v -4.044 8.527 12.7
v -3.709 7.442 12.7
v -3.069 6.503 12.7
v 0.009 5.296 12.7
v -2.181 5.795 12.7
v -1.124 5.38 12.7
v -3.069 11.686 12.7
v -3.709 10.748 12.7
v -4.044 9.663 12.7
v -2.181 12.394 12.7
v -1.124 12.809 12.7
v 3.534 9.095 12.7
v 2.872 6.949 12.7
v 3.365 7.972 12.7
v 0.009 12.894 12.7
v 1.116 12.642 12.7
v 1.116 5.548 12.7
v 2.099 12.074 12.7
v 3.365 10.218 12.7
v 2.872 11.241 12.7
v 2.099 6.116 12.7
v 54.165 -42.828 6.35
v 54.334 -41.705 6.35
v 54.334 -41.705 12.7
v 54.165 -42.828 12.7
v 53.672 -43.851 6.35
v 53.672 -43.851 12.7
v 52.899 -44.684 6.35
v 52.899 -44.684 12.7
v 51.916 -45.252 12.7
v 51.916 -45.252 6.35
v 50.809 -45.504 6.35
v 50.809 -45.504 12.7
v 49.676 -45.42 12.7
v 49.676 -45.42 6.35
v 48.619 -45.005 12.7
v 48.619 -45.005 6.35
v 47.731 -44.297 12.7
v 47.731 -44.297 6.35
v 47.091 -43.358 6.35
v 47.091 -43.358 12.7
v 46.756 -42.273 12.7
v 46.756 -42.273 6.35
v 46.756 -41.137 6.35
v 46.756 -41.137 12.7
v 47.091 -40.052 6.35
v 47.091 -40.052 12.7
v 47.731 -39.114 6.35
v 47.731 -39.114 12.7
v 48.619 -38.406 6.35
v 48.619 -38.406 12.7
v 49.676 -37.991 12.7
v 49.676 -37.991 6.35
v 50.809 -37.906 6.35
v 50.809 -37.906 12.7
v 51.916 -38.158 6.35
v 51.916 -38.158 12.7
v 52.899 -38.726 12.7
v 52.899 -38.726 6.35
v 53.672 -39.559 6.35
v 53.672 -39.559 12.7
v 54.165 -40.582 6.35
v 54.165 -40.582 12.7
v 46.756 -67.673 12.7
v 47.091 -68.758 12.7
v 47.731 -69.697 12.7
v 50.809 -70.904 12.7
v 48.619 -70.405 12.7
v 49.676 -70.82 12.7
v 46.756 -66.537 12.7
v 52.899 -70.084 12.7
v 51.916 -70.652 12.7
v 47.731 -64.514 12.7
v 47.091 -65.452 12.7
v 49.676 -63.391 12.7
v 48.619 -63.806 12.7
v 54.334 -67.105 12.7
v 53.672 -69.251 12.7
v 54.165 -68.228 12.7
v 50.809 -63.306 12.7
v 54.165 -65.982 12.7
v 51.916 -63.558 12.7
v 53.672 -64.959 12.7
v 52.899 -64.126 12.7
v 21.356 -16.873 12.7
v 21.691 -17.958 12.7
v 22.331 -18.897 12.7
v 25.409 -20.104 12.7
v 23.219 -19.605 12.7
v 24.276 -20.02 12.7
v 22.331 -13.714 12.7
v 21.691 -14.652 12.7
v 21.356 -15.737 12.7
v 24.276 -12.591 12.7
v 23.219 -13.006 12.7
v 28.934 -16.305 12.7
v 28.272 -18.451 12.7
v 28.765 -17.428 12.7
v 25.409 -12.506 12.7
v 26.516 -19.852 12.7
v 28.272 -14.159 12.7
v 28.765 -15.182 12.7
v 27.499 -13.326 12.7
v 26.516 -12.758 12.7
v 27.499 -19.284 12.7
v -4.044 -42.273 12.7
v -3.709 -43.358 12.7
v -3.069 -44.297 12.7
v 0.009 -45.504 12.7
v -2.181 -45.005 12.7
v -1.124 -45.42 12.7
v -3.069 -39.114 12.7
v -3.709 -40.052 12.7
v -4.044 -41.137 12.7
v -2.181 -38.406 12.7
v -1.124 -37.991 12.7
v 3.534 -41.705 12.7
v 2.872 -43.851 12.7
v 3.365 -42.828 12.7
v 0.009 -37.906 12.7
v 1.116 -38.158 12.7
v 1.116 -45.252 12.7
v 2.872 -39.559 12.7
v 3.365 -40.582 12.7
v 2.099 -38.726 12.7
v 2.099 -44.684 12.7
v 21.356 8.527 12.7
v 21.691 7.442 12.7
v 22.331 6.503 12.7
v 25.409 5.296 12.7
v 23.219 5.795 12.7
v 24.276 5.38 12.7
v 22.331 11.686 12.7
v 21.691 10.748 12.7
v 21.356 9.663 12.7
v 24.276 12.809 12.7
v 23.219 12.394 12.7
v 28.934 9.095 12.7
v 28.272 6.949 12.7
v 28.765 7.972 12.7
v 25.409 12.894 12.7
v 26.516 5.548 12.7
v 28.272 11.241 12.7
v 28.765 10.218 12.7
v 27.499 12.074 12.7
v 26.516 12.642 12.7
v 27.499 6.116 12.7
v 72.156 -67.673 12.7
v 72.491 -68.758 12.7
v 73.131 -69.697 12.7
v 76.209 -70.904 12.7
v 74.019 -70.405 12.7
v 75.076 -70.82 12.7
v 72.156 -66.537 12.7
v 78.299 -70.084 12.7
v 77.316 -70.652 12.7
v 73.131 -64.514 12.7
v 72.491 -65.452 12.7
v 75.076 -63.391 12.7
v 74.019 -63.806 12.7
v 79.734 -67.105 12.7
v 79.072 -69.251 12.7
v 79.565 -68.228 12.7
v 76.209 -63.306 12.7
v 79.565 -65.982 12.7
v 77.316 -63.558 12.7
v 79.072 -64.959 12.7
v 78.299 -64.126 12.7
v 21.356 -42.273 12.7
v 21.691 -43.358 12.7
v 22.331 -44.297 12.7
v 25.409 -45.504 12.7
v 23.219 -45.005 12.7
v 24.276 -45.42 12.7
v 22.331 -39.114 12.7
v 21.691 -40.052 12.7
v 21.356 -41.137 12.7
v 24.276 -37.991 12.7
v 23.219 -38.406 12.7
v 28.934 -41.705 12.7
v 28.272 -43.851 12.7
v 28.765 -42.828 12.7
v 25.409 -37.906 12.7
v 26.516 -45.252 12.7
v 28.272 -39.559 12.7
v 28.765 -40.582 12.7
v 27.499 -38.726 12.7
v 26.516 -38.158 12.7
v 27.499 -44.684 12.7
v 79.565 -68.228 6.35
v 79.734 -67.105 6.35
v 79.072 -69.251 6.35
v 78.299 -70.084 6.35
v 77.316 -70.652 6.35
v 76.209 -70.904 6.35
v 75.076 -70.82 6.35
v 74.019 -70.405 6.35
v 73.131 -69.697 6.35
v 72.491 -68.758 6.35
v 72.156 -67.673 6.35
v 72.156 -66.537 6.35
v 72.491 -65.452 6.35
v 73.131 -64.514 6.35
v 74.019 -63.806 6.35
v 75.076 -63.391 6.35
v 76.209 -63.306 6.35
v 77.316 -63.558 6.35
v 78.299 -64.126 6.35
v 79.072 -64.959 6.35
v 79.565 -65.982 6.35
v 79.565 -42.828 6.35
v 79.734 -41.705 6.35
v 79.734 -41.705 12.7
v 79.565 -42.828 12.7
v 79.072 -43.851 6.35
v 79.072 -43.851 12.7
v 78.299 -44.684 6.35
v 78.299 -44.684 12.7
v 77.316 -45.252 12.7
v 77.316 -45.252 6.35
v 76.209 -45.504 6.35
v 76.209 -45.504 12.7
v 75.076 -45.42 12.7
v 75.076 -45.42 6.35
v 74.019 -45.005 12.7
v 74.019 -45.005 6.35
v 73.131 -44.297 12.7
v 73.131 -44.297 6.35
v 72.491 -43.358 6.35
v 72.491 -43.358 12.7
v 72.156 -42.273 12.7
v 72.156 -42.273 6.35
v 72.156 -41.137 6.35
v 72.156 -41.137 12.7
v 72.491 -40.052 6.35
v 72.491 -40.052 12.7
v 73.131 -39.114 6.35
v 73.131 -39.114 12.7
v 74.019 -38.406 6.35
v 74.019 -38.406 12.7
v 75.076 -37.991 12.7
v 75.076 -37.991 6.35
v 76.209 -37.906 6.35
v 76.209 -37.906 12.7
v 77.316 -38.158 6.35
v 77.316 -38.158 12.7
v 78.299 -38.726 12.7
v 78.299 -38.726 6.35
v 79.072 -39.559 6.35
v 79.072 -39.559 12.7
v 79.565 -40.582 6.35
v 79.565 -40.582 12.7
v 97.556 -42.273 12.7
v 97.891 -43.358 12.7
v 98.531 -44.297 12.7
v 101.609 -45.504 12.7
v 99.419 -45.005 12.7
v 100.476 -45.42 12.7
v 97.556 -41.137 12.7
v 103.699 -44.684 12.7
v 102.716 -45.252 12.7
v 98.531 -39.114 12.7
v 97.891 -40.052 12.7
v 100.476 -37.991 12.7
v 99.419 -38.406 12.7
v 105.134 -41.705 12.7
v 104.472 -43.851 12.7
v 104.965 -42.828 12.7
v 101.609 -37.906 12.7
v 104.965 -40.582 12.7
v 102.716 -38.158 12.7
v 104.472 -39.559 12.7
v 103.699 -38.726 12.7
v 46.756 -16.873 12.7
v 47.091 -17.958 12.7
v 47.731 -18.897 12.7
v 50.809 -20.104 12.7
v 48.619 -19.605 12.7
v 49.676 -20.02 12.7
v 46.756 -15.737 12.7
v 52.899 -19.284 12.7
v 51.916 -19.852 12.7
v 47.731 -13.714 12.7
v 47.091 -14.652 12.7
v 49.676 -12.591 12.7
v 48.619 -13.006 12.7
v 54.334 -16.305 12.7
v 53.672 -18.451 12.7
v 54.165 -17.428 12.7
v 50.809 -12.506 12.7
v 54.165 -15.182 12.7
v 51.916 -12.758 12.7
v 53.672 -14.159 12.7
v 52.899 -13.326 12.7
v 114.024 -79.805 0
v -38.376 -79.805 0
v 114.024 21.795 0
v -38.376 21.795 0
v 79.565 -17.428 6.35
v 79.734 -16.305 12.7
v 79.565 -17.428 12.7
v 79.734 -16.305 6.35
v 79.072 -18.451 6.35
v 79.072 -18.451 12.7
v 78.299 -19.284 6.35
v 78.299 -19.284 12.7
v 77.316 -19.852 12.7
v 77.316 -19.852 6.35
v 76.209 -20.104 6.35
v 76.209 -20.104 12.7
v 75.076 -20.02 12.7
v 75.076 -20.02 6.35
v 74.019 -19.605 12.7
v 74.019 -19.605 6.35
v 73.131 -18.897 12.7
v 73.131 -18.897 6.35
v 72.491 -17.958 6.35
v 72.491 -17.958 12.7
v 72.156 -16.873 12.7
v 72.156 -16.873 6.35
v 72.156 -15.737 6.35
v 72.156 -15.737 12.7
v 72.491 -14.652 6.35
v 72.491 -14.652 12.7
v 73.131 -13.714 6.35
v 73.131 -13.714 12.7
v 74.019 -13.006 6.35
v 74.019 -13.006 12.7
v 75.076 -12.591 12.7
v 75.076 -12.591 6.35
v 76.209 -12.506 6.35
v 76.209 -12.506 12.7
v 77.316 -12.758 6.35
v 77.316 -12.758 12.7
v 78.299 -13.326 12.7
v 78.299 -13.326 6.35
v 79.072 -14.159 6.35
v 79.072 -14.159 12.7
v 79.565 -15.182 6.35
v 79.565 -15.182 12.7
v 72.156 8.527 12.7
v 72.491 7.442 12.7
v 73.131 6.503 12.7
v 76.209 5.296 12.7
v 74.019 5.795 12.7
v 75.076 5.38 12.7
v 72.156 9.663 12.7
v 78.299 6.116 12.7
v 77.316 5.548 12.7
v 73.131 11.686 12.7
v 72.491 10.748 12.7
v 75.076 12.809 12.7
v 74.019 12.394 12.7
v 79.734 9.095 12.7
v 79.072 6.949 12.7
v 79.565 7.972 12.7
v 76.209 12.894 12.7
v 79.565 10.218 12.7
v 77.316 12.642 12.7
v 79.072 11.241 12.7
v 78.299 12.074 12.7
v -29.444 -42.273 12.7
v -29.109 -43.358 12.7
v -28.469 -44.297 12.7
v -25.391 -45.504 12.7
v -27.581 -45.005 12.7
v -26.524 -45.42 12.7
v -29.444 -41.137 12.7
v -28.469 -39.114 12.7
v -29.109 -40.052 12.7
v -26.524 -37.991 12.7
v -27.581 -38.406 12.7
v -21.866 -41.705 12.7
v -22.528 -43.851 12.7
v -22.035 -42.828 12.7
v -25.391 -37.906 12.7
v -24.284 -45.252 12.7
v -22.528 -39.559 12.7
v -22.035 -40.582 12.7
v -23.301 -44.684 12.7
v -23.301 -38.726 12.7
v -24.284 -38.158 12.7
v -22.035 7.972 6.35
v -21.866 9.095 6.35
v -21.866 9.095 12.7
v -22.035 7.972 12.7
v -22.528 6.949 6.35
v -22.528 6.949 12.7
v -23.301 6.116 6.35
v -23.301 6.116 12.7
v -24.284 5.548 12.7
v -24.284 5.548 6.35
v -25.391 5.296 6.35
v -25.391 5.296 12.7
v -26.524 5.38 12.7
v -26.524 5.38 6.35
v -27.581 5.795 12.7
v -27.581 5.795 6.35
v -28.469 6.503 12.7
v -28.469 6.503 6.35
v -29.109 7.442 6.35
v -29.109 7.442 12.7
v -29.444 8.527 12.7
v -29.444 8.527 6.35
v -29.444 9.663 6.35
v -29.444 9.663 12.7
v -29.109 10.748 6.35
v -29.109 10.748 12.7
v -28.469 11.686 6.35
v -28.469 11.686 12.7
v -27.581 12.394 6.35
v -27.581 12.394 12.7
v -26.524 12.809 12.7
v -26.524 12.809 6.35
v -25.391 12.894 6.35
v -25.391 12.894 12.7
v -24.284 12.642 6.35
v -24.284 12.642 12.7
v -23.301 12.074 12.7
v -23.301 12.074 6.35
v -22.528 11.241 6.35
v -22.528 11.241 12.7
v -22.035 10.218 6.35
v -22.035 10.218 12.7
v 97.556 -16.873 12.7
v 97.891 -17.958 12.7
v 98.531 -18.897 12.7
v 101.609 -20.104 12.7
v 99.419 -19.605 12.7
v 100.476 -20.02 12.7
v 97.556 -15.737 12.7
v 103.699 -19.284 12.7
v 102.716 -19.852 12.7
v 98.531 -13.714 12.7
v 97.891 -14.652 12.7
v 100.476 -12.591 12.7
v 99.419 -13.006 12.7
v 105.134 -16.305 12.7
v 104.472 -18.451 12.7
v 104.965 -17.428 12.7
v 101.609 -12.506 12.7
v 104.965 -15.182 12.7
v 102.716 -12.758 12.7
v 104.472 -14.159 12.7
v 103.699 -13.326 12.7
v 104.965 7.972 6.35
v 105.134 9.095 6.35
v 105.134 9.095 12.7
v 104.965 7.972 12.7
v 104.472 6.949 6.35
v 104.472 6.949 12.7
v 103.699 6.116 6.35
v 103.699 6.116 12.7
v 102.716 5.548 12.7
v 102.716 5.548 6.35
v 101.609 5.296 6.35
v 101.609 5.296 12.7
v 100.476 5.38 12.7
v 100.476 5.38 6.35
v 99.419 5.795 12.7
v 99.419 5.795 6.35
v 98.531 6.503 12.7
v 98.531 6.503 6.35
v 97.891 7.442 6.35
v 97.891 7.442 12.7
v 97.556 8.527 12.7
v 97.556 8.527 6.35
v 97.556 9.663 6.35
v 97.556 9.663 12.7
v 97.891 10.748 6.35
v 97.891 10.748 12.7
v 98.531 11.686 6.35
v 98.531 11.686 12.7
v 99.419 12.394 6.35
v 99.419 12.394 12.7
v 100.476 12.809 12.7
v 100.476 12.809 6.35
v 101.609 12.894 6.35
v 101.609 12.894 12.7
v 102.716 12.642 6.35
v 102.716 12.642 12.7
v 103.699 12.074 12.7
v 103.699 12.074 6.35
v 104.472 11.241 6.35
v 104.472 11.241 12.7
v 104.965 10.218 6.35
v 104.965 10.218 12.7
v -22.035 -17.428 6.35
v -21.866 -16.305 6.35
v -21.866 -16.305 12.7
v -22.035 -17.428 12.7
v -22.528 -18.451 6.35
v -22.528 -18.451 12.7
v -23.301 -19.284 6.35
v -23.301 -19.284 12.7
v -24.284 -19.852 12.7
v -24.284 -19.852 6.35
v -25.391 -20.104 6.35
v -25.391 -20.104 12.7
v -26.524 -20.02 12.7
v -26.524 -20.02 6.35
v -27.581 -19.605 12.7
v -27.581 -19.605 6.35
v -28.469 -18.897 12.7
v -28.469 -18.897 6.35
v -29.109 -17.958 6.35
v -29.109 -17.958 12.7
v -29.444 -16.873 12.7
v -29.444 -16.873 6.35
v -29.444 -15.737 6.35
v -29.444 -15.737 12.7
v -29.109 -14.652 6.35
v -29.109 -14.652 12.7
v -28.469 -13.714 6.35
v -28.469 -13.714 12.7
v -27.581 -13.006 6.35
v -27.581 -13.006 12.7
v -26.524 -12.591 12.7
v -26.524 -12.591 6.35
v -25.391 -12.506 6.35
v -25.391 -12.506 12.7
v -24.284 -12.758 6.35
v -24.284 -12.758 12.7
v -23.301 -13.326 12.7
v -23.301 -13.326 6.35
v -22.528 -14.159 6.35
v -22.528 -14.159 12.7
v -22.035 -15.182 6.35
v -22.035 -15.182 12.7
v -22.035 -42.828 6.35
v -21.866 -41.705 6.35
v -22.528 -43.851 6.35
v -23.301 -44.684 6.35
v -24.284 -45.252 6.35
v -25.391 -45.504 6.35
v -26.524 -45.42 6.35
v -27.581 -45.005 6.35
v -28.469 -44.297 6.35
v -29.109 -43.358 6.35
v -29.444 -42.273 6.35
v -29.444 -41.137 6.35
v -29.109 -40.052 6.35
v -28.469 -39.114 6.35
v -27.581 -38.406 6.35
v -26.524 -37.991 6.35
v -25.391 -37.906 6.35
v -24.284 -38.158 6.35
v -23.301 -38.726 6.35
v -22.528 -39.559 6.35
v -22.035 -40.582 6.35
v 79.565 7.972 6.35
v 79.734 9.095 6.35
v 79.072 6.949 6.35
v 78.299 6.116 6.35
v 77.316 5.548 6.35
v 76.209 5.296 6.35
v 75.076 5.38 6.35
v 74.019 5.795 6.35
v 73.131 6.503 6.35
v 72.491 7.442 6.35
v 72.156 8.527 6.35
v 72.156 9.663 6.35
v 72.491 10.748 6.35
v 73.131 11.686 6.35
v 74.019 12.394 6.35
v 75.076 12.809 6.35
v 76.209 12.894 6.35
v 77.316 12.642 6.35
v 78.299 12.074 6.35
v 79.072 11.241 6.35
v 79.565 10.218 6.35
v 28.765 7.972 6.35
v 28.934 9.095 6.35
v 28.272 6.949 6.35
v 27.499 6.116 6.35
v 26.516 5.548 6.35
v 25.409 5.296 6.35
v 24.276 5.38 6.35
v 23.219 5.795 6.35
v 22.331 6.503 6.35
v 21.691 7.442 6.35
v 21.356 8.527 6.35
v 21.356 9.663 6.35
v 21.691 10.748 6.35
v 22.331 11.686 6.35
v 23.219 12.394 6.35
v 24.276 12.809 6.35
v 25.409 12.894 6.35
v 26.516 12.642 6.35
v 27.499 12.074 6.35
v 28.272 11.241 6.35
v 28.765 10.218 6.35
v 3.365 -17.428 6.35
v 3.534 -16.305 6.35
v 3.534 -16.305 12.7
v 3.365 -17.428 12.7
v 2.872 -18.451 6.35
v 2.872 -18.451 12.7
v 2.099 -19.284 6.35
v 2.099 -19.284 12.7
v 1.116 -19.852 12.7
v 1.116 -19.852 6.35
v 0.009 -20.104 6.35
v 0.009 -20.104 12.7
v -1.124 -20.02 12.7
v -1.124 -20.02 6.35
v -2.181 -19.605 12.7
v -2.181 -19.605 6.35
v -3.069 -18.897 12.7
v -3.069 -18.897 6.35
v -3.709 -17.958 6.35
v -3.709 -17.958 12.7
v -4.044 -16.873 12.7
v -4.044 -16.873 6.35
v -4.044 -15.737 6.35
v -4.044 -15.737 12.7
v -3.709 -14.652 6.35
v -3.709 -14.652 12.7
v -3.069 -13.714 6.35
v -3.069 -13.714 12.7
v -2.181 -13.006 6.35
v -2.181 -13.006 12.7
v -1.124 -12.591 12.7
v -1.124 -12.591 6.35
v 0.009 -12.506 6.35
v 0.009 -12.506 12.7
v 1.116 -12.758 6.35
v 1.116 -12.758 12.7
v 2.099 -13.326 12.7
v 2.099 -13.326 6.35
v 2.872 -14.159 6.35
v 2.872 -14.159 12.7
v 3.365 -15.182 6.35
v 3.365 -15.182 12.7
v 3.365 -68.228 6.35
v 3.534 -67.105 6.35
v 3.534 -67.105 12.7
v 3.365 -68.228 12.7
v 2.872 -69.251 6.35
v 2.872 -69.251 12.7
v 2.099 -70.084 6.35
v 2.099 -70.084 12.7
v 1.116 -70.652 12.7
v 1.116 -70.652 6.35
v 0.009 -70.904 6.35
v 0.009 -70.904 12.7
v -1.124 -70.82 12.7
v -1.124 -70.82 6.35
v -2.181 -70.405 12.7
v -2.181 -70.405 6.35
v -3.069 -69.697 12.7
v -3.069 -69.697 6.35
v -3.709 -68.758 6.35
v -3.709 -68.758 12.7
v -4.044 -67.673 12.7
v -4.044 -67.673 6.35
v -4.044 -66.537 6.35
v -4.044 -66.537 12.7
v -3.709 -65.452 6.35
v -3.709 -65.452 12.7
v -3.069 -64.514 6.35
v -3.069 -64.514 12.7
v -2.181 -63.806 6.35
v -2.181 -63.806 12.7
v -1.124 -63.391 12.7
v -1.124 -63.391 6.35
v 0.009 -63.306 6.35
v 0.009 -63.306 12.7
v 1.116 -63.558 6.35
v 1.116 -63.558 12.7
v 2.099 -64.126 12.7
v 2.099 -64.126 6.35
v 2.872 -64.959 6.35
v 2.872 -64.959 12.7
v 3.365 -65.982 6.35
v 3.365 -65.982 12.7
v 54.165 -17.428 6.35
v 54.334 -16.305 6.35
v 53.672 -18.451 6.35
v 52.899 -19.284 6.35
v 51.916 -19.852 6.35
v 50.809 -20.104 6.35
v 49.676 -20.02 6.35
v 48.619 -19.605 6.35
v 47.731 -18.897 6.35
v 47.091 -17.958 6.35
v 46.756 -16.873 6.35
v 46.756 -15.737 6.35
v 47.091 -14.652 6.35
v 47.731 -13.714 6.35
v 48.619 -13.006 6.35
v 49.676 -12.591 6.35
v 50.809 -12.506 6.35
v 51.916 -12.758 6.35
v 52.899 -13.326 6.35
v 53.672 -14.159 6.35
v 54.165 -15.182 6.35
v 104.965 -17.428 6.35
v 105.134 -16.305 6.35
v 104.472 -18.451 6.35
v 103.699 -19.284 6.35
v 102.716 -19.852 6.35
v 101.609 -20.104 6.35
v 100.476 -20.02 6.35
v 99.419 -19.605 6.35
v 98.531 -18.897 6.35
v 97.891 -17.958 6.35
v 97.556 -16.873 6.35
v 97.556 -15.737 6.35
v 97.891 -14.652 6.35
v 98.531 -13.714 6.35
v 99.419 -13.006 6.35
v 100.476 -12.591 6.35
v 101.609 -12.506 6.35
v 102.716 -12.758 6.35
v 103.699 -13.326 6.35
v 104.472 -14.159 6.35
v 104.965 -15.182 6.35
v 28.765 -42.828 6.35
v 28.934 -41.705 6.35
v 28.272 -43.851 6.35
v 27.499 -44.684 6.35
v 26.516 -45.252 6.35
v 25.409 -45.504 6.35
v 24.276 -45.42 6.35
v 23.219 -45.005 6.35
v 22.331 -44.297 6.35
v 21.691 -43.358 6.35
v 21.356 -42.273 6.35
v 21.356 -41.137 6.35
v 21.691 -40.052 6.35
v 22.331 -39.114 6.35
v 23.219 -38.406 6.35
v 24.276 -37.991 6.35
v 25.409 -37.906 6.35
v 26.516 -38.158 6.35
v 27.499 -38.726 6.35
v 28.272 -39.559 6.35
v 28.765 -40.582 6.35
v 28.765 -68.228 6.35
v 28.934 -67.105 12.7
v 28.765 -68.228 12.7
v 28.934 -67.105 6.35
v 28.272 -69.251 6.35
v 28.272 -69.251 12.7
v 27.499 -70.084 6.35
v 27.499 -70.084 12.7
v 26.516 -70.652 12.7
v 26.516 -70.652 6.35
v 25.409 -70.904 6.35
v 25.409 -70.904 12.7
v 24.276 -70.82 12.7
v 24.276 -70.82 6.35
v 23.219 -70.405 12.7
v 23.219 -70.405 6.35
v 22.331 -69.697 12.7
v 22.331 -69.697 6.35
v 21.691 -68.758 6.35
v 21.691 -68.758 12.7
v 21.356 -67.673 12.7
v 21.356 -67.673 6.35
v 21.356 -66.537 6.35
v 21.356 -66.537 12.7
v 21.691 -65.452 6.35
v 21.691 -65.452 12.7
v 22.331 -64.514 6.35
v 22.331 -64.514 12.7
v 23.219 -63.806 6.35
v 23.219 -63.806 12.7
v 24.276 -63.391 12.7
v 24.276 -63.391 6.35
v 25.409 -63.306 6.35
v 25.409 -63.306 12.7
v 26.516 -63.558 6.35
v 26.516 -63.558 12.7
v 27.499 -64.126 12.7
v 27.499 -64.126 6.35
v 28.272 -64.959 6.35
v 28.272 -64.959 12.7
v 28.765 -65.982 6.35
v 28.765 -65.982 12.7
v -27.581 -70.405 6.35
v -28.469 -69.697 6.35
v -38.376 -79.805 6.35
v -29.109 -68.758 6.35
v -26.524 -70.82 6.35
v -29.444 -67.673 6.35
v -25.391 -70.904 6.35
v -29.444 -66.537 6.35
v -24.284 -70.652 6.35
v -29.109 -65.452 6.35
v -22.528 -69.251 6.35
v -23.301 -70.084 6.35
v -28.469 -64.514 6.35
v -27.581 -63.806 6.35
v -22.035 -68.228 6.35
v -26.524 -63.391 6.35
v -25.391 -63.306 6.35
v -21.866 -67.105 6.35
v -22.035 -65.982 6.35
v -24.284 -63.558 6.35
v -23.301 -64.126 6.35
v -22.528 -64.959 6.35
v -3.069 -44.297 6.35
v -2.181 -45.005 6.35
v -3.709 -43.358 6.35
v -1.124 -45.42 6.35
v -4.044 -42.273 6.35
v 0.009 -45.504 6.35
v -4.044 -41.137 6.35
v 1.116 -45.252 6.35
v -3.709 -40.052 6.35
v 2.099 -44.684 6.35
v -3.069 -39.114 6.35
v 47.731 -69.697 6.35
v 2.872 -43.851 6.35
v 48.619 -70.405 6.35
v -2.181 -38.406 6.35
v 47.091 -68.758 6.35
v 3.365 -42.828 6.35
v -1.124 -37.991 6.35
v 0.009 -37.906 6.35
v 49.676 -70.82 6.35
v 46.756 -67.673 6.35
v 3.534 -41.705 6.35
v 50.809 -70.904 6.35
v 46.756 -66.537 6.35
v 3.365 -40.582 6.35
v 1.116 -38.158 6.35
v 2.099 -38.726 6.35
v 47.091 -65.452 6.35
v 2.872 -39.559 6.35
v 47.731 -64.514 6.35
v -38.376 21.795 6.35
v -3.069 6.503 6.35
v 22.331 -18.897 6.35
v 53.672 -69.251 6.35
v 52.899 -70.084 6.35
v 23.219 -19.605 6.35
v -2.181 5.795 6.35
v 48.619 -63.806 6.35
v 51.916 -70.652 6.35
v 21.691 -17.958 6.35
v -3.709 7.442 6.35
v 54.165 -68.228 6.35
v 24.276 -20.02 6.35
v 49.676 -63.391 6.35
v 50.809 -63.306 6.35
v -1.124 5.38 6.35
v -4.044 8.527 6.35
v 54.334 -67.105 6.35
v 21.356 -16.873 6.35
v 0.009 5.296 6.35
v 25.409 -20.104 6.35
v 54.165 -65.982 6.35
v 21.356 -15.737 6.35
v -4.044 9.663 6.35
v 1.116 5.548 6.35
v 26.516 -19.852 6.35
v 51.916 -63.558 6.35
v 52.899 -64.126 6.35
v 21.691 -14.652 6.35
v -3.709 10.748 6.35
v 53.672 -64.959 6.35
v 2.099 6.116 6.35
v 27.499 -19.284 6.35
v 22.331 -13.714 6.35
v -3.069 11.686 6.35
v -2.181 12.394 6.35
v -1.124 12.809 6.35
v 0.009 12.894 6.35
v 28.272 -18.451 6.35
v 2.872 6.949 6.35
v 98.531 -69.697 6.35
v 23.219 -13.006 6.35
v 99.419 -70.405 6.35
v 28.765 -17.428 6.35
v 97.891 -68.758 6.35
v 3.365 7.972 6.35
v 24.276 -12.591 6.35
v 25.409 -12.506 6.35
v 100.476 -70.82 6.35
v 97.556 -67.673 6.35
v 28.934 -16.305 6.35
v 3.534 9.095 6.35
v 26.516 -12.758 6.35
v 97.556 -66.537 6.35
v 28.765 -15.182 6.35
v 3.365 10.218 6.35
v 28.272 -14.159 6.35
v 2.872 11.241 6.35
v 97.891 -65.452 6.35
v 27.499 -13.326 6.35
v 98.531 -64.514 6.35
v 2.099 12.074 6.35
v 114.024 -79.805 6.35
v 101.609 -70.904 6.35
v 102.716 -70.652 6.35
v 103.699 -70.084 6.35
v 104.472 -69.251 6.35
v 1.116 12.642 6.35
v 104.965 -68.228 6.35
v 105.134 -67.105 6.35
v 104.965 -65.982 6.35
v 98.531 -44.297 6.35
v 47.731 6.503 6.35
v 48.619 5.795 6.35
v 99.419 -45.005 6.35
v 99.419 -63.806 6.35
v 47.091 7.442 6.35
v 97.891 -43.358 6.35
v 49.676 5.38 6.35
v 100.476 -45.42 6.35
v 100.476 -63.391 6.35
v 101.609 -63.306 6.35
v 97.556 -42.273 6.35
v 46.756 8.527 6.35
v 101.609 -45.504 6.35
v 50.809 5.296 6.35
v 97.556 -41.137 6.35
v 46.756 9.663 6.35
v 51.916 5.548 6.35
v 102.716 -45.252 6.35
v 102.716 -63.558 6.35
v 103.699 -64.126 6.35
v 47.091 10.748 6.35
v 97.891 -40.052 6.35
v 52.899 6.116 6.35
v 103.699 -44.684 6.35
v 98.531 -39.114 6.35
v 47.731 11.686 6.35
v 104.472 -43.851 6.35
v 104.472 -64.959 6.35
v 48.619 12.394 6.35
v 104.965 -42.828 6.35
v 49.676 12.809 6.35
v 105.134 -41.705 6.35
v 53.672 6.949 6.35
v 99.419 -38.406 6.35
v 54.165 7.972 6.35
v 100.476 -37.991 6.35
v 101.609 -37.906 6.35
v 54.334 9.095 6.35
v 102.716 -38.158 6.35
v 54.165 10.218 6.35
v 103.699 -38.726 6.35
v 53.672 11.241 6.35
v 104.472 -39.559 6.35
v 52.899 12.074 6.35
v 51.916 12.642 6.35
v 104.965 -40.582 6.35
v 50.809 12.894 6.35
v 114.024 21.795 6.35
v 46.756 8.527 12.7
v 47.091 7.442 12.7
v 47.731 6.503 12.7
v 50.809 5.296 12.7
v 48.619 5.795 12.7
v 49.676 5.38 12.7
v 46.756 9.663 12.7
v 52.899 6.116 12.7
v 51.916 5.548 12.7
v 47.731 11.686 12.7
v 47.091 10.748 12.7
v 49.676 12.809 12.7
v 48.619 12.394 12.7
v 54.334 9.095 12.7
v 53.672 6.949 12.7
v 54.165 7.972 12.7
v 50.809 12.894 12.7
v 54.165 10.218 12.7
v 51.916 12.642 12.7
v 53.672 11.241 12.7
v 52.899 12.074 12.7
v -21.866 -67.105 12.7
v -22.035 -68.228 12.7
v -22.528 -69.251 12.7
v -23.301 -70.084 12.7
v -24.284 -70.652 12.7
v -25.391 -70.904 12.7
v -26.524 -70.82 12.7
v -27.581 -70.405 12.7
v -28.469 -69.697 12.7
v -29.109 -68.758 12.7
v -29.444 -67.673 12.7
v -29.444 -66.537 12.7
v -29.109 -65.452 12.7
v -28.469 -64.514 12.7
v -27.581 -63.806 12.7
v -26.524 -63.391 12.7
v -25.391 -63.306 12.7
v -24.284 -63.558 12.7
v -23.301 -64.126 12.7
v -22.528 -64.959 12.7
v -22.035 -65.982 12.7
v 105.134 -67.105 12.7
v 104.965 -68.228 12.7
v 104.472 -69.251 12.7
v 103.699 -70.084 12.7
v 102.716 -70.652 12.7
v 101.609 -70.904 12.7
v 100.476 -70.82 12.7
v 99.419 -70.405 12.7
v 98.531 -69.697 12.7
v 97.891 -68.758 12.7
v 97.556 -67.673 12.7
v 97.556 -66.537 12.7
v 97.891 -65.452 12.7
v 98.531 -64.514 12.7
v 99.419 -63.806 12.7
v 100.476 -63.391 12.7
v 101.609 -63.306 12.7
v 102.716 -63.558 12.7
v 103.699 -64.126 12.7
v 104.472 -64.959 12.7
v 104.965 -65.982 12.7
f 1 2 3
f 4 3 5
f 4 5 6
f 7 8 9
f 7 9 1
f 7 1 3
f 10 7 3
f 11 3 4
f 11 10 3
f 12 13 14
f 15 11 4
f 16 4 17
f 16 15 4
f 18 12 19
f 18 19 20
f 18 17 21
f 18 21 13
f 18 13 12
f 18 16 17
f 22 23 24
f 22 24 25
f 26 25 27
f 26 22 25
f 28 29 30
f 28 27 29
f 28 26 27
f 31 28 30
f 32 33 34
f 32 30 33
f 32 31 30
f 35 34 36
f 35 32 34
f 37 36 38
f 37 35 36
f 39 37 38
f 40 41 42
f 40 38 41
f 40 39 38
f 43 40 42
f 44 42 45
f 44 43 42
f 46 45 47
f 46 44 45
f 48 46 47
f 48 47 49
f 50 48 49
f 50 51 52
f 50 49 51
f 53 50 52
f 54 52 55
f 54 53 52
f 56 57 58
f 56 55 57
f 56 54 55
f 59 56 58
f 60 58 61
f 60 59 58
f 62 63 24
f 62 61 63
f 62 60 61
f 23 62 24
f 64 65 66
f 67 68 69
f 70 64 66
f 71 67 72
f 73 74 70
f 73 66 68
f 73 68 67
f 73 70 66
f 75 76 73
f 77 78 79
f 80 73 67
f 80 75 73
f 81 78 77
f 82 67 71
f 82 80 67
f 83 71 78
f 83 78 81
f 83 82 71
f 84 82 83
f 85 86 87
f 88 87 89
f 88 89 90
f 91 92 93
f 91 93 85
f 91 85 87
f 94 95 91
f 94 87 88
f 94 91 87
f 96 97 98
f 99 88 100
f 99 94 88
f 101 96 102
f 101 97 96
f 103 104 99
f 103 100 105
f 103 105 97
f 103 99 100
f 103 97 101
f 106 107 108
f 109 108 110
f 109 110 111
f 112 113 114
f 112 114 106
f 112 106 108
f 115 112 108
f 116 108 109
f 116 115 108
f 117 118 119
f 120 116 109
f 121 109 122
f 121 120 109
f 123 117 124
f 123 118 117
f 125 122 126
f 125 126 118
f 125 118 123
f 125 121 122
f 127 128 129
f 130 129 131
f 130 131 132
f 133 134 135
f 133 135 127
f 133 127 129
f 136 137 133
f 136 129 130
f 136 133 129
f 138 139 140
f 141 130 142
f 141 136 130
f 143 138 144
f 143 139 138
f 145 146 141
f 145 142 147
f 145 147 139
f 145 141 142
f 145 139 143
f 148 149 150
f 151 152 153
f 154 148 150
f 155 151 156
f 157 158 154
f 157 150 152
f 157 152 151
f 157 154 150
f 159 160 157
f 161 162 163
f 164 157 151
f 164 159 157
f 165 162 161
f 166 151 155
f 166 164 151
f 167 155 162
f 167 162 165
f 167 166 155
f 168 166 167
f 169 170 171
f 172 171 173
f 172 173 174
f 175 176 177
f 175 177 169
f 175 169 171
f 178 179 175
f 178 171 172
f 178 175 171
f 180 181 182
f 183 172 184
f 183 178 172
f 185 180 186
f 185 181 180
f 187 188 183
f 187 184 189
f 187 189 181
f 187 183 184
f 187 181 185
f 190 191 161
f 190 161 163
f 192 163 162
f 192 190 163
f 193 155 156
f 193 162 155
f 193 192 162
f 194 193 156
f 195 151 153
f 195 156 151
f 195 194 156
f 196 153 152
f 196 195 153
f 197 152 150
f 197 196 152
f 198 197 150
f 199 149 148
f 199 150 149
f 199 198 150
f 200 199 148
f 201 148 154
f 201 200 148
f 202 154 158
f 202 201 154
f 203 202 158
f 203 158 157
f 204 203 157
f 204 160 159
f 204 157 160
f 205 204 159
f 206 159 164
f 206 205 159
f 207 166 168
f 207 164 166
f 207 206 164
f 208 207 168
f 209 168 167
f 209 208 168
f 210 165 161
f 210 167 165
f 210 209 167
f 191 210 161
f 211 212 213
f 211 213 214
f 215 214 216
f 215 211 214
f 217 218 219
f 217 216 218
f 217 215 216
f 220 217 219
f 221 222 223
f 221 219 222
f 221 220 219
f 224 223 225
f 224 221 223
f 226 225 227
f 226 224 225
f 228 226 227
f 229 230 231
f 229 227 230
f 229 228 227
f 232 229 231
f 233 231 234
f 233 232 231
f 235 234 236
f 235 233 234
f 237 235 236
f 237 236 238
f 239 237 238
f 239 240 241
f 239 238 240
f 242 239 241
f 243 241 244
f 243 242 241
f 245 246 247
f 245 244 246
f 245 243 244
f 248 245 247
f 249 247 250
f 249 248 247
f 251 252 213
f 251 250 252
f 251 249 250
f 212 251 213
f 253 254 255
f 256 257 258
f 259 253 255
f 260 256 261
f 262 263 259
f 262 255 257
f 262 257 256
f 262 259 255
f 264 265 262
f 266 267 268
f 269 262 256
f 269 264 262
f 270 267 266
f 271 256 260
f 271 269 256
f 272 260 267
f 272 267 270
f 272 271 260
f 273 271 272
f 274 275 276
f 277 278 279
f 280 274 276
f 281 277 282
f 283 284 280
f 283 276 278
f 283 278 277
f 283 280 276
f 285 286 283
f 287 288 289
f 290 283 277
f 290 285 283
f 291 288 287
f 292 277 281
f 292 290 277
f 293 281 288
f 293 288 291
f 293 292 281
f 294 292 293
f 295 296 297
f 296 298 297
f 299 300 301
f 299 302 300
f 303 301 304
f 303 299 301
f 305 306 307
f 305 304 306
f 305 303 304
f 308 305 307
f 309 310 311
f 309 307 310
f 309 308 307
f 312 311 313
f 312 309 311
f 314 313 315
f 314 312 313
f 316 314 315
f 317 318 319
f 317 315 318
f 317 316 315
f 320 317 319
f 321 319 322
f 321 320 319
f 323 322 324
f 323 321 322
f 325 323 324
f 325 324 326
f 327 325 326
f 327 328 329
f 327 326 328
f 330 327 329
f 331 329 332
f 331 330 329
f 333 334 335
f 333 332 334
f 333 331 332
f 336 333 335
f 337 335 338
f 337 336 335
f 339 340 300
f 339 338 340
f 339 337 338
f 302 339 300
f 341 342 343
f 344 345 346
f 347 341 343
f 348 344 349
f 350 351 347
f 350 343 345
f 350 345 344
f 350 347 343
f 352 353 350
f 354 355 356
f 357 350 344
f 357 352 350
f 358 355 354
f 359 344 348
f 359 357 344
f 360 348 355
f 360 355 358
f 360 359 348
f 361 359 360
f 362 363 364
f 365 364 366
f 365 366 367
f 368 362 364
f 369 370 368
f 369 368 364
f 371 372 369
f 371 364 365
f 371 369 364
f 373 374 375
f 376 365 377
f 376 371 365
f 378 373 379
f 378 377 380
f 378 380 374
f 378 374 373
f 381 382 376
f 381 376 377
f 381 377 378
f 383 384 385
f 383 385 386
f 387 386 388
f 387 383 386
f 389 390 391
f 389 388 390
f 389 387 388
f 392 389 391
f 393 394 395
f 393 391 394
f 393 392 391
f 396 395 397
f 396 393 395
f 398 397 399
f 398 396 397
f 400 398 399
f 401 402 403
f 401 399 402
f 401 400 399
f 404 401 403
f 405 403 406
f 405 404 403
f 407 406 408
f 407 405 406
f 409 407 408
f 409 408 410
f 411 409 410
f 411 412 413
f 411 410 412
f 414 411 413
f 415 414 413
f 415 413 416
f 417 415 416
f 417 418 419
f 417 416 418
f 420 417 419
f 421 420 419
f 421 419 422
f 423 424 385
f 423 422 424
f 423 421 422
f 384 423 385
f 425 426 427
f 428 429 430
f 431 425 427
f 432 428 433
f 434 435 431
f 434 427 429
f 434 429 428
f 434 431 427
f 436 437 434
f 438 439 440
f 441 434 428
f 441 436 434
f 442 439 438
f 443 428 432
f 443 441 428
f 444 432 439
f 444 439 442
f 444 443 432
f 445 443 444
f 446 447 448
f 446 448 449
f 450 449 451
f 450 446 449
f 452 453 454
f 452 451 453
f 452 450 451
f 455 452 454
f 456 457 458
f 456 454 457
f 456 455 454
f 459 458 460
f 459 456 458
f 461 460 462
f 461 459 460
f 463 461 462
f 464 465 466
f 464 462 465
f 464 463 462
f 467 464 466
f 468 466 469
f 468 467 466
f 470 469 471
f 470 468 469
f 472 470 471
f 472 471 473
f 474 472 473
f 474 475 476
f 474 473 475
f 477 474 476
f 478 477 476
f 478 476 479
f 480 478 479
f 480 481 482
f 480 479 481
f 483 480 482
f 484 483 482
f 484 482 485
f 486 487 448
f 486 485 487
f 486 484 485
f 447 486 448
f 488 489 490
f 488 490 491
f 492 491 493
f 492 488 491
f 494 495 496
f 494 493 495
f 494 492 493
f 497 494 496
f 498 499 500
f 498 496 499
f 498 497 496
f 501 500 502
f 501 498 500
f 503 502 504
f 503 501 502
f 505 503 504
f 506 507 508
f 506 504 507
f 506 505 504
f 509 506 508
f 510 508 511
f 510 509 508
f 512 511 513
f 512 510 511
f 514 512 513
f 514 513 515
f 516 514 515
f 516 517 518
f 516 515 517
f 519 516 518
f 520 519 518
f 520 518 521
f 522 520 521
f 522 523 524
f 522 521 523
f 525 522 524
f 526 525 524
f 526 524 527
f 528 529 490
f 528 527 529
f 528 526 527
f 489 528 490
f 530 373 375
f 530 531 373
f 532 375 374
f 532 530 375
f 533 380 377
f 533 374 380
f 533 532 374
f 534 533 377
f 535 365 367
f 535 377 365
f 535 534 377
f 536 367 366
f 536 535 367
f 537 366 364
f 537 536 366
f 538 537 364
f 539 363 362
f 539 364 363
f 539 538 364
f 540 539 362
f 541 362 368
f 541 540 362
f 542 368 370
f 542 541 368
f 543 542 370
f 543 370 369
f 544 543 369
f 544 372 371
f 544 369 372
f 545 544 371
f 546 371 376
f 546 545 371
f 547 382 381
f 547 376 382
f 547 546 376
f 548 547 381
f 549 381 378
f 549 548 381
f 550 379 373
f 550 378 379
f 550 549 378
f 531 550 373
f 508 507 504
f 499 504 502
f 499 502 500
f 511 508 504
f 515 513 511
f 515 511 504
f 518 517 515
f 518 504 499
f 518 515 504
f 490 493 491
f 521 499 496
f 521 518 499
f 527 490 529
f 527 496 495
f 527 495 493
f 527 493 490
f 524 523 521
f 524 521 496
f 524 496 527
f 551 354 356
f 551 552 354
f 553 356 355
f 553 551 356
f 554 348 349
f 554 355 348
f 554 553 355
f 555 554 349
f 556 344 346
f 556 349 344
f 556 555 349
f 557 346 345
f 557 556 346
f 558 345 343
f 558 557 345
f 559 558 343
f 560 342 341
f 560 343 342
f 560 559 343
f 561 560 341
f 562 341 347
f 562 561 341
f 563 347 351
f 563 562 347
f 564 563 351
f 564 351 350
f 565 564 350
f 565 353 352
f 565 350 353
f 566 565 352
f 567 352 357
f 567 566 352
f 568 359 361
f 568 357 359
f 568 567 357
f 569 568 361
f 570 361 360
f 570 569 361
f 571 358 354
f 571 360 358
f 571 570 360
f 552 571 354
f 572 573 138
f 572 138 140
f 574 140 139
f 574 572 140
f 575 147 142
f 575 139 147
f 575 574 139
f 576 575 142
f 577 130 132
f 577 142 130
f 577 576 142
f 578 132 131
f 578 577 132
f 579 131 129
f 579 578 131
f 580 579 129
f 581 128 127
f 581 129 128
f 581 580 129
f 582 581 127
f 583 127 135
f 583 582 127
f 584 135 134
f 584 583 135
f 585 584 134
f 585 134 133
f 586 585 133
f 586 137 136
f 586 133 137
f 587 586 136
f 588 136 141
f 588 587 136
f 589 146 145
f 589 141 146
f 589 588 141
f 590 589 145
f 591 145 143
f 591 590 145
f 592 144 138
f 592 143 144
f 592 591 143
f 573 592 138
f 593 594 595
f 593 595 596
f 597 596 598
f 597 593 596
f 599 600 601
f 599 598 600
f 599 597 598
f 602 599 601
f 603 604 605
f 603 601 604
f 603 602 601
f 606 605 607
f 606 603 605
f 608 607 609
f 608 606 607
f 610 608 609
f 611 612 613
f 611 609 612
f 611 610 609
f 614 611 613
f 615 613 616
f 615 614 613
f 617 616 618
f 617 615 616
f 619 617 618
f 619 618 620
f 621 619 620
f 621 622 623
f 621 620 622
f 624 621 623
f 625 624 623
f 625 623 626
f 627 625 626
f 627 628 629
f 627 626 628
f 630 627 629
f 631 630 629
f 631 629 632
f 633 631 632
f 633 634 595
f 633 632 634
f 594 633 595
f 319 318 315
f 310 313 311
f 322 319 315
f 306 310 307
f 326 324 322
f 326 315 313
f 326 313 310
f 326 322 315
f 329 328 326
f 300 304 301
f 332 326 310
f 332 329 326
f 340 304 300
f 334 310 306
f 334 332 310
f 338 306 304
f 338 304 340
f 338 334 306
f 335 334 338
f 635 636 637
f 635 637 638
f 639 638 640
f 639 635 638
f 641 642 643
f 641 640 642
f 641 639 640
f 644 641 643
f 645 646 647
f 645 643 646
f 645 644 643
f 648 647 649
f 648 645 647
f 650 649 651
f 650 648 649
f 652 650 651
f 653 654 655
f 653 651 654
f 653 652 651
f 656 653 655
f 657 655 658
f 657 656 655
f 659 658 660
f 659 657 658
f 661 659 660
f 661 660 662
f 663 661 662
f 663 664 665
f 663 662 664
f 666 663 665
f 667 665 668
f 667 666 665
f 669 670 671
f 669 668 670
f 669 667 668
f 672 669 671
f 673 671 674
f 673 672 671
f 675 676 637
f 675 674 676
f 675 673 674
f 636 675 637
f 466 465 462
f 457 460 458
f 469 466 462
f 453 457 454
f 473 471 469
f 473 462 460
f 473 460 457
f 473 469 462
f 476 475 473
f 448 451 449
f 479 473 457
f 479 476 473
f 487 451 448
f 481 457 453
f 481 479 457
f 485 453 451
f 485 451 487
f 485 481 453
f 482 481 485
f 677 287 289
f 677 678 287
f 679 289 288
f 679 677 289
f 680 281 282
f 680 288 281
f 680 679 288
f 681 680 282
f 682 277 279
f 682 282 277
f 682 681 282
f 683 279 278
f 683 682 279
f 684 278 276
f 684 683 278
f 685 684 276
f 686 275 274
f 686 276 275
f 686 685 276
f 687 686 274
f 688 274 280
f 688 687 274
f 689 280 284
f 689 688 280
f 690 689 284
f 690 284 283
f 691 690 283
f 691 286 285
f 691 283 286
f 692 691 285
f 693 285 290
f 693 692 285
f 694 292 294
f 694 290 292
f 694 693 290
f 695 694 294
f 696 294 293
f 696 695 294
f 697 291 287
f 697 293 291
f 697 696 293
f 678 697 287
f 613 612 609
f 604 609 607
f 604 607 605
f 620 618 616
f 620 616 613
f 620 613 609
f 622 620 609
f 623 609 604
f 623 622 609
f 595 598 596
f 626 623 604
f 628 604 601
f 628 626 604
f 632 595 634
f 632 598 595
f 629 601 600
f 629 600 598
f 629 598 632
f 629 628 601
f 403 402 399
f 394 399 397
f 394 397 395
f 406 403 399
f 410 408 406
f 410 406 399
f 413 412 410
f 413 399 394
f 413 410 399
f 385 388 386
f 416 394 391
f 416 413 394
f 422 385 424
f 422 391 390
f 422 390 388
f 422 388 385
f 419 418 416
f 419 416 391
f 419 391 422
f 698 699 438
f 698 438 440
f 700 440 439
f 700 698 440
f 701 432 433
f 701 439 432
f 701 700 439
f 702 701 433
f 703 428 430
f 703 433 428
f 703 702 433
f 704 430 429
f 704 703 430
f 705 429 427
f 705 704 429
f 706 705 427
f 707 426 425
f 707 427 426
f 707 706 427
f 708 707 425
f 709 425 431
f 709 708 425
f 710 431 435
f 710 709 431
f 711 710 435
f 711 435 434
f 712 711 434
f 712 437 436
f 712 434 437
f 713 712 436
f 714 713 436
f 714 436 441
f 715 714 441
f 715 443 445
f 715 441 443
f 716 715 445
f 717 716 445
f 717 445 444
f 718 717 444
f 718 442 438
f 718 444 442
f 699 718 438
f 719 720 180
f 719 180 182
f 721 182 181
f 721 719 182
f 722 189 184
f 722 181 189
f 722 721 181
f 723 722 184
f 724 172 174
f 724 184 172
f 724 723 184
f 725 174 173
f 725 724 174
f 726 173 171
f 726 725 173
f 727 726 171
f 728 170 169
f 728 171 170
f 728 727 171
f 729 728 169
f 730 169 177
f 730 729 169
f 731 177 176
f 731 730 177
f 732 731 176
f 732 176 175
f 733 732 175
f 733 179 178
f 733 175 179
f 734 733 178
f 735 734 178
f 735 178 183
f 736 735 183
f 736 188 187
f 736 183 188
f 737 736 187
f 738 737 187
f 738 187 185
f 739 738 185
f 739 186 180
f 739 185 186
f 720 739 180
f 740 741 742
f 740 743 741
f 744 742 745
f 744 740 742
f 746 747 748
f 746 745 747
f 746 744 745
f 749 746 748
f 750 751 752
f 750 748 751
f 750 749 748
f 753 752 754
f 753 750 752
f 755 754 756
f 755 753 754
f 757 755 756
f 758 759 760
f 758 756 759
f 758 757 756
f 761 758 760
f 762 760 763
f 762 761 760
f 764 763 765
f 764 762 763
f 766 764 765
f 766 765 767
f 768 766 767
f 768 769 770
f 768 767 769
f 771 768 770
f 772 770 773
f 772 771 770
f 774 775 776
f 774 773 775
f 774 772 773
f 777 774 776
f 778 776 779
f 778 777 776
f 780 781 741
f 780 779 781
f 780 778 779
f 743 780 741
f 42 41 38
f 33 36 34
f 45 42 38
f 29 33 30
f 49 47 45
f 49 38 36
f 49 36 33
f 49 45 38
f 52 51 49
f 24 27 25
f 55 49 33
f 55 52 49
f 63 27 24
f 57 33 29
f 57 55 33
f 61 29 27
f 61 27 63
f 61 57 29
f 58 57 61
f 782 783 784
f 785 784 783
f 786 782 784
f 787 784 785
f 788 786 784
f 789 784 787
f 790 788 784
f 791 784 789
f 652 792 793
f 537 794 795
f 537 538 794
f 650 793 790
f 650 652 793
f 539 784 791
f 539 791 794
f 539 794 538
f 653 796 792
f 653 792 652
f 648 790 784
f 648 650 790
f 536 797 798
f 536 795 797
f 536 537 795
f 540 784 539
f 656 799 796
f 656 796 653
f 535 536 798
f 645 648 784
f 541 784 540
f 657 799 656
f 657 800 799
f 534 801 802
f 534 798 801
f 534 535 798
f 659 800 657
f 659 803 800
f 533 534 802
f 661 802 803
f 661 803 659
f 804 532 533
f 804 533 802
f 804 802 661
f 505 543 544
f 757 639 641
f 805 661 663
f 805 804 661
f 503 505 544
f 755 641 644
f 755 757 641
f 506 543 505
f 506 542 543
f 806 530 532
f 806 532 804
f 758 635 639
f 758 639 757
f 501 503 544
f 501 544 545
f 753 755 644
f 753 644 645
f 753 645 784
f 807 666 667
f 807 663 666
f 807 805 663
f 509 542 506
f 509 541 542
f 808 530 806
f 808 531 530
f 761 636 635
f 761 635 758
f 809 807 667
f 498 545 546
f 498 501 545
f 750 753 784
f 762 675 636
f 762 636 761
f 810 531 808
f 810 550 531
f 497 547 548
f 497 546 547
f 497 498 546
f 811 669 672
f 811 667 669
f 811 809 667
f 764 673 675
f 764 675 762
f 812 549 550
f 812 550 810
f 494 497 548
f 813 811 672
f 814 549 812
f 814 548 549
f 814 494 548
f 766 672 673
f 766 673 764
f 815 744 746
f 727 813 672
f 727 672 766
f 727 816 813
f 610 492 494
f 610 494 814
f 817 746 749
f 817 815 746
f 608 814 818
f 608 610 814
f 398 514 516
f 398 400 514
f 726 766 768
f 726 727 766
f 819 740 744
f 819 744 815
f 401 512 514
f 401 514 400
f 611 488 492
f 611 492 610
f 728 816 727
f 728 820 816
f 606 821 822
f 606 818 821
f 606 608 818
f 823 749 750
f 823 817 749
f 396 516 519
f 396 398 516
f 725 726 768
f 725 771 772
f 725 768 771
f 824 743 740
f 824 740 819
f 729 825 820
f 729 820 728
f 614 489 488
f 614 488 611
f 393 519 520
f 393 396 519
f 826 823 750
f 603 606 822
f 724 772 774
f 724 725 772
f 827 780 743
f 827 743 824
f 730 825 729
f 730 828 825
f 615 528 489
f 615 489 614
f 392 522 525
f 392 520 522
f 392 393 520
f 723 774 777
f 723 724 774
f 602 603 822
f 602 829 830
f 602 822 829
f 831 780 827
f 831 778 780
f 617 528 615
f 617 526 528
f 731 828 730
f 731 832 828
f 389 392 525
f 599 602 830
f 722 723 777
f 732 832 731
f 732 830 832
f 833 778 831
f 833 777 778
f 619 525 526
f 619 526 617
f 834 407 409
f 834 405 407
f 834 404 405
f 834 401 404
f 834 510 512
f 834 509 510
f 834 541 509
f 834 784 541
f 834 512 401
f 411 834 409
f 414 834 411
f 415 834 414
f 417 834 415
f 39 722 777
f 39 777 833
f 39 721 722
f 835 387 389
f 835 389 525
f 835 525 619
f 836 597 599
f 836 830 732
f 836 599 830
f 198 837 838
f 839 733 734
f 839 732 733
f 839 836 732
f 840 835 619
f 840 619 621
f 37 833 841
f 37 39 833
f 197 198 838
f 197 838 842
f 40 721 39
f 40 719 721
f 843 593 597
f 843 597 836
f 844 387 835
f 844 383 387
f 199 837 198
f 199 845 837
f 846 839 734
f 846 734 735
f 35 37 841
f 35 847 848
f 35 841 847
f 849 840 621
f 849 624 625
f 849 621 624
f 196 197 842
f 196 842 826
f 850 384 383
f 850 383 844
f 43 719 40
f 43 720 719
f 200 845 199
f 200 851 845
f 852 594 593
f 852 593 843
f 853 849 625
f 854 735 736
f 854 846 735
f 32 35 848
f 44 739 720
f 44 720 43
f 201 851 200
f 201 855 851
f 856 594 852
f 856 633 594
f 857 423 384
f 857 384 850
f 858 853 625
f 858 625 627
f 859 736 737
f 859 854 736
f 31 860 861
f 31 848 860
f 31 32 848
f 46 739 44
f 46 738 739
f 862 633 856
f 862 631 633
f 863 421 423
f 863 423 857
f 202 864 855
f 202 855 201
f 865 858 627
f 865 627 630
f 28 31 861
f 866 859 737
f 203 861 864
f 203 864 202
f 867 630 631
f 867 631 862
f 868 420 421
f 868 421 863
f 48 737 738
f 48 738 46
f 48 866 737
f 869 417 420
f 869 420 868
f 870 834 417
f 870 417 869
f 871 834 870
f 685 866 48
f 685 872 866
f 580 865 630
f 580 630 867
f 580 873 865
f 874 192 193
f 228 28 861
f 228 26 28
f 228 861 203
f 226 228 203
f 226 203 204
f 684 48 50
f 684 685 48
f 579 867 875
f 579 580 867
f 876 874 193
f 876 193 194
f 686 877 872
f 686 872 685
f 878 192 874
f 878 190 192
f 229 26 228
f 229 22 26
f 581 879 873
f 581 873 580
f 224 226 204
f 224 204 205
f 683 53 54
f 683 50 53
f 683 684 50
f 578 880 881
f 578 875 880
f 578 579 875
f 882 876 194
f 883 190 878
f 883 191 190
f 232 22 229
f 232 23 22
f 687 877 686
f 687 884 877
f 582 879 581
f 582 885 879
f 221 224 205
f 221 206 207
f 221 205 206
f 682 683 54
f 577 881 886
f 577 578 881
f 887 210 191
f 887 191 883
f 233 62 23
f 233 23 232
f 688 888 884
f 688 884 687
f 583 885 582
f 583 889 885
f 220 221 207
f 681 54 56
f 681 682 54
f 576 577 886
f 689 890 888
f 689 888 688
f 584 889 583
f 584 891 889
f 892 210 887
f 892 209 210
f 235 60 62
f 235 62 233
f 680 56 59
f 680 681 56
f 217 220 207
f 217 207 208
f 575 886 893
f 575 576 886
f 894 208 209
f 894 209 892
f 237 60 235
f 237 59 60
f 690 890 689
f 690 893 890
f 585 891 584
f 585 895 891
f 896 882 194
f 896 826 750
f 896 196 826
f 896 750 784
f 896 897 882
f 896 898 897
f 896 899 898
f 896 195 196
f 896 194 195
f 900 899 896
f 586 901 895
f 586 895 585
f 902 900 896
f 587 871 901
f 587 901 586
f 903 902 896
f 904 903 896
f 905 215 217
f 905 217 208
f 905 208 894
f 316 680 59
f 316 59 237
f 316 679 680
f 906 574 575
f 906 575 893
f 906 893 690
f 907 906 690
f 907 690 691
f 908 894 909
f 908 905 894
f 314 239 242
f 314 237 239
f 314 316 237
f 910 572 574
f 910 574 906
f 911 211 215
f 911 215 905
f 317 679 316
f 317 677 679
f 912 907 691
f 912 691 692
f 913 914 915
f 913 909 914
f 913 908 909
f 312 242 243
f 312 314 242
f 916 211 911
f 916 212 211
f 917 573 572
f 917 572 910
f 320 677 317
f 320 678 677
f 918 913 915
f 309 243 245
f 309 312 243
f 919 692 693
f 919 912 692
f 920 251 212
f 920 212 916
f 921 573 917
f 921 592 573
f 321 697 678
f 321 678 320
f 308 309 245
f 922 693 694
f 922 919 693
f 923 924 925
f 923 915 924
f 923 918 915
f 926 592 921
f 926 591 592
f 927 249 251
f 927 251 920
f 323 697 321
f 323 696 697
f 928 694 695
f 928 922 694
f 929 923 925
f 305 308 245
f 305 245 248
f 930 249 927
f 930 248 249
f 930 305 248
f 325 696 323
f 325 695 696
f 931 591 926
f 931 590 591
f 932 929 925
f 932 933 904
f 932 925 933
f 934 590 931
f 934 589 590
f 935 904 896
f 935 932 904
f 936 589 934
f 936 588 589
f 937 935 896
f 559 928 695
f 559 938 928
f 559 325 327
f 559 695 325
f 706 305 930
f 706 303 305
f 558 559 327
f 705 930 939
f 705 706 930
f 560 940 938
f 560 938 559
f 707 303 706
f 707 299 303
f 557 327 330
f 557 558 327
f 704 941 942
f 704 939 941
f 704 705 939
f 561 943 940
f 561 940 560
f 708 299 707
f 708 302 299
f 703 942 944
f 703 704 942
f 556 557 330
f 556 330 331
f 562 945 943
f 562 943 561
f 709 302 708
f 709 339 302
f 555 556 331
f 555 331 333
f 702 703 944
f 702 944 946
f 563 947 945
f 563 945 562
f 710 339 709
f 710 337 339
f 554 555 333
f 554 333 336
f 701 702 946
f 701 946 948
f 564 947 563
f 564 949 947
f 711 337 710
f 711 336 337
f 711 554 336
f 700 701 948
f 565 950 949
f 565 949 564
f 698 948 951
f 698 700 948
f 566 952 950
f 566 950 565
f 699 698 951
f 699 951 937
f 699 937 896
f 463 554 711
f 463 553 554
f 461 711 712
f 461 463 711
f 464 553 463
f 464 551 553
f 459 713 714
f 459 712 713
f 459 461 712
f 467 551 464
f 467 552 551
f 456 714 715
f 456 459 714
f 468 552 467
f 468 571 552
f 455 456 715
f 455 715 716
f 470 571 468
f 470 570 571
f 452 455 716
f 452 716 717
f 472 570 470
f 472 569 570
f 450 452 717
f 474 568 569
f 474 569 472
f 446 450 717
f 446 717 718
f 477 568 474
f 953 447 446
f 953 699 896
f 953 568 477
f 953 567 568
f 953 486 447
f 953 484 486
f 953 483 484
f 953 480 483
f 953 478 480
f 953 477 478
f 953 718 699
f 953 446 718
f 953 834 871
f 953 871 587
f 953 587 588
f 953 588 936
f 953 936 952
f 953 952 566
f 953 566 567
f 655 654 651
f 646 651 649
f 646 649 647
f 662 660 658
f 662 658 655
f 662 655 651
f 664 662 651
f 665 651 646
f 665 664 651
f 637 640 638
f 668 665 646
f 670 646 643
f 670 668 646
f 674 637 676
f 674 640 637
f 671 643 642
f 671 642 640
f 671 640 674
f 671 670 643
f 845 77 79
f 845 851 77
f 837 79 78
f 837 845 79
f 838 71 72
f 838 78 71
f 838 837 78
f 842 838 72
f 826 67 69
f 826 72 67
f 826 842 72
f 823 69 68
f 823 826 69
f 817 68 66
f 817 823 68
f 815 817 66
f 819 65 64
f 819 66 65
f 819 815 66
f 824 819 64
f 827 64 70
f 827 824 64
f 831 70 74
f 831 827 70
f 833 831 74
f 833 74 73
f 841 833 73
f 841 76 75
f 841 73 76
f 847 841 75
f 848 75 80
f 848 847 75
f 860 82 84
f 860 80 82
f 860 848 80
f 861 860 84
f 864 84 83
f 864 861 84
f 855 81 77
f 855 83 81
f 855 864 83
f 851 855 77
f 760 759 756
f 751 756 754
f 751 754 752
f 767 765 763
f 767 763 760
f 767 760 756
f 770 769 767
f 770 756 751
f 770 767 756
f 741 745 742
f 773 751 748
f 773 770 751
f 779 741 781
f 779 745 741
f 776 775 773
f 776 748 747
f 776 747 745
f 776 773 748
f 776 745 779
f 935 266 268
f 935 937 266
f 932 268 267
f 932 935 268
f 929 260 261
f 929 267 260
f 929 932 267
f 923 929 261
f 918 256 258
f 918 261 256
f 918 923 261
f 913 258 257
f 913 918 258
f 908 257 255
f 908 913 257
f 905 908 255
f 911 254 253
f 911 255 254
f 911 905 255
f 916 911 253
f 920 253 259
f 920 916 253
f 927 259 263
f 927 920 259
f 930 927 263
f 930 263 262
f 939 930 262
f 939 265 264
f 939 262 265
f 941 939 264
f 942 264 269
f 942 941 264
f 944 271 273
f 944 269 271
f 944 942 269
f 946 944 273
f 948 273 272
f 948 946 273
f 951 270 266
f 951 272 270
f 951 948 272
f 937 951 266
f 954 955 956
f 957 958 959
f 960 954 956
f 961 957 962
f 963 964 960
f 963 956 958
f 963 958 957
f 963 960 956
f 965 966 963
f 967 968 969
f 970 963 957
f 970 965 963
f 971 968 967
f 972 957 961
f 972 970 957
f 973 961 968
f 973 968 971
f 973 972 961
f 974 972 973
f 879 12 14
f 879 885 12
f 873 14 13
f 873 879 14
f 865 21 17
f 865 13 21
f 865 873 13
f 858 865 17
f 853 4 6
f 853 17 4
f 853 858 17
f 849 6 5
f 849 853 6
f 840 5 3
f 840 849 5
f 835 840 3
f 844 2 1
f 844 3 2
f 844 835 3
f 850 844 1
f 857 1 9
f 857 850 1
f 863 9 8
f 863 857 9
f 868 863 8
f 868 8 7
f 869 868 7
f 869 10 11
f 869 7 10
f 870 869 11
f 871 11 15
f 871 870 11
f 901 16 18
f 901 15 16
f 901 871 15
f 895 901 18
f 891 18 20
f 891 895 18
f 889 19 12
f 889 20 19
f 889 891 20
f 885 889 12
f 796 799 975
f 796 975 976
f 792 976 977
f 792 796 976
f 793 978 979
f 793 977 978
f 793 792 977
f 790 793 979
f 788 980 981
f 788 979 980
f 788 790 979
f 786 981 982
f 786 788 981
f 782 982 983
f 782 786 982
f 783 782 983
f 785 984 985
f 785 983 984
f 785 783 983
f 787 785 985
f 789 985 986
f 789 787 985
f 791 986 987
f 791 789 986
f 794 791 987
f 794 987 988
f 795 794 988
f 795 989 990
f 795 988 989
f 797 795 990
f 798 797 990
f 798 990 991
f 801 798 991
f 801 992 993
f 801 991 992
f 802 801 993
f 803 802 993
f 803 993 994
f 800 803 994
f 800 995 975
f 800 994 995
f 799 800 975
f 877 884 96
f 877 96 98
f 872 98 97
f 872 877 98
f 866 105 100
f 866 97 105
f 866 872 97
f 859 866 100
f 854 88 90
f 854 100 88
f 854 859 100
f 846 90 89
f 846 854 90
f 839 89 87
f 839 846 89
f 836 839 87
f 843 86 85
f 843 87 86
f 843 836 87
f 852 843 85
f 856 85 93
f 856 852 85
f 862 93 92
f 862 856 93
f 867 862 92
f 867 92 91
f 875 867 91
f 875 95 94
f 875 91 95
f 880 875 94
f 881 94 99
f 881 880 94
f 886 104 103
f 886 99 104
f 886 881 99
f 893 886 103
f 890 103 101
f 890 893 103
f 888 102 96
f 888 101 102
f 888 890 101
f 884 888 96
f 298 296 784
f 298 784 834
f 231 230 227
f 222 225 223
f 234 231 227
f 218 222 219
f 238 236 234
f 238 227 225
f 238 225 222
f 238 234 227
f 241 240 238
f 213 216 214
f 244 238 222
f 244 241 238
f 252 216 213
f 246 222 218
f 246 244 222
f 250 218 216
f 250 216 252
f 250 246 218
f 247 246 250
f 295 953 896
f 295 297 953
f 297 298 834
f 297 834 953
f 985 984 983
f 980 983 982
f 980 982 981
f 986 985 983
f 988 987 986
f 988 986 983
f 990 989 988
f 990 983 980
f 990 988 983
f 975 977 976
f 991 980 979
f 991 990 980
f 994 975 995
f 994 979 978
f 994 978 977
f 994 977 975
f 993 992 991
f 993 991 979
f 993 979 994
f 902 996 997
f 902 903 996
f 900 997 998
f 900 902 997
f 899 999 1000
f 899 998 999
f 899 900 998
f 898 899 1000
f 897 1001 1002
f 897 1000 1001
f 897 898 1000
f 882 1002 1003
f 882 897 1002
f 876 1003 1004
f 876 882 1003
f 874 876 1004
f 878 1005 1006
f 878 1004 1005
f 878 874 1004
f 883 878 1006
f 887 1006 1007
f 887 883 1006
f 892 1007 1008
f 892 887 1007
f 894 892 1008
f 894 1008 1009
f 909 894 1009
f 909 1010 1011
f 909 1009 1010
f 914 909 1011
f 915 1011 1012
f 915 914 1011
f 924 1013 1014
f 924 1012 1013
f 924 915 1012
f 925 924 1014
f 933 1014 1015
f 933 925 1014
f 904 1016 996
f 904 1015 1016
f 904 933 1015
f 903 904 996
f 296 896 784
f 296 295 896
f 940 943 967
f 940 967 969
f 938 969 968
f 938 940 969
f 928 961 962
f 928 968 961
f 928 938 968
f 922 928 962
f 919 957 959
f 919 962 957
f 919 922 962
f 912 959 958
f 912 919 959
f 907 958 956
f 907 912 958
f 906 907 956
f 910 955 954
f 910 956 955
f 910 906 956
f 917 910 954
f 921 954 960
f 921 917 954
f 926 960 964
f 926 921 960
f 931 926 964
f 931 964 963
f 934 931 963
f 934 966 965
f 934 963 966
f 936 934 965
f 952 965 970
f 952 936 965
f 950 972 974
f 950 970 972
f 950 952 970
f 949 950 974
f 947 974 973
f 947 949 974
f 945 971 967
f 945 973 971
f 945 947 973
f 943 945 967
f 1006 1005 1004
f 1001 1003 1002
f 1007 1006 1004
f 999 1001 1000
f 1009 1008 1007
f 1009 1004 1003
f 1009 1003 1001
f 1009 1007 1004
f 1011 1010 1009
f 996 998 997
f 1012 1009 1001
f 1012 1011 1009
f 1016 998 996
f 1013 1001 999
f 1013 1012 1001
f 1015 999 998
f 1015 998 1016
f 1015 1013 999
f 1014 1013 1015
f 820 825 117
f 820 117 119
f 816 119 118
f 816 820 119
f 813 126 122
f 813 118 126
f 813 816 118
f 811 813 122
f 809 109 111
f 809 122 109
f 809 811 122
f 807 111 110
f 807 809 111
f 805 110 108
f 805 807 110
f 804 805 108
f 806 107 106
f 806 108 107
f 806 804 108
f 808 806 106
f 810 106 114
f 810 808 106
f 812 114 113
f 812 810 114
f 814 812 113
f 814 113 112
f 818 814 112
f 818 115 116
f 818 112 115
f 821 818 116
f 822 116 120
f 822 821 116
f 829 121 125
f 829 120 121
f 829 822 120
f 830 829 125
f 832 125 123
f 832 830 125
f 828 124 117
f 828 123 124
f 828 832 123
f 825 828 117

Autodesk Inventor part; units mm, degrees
ref_plane "YZ Plane" through (0, 0, 0) normal (1, 0, 0) x (0, 1, 0)
ref_plane "XZ Plane" through (0, 0, 0) normal (0, 1, 0) x (-1, 0, 0)
ref_plane "XY Plane" through (0, 0, 0) normal (0, 0, 1) x (1, 0, 0)
sketch "Sketch1" plane through (0, 0, 0) normal (0, 0, 1) x (1, 0, 0)
  line L0 (-38.3761, 21.7949) -> (114.0239, 21.7949)
  line L1 (114.0239, 21.7949) -> (114.0239, -79.8051)
  line L2 (114.0239, -79.8051) -> (-38.3761, -79.8051)
  line L3 (-38.3761, -79.8051) -> (-38.3761, 21.7949)
  dimension "d0" = 152.4
  dimension "d1" = 101.6
extrude "Extrusion1" add sketch "Sketch1" along normal blind 6.35
sketch "Sketch2" plane through (0, 0, 6.35) normal (0, 0, 1) x (1, 0, 0)
  line L0 (-38.3761, -79.8051) -> (-38.3761, 21.7949) projected
  line L1 (114.0239, -79.8051) -> (-38.3761, -79.8051) projected
  circle A0 centre (-25.6761, -67.1051) radius 3.81
  dimension "d4" = 7.62
  dimension "d5" = 12.7
  dimension "d6" = 12.7
extrude "Extrusion2" add sketch "Sketch2" along normal blind 6.35
pattern_linear "Rectangular Pattern1" count 6 spacing 25.4 along (1, 0, 0) count 4 spacing 25.4 along (0, 1, 0) of "Extrusion2"
properties part number "Rectangular"
